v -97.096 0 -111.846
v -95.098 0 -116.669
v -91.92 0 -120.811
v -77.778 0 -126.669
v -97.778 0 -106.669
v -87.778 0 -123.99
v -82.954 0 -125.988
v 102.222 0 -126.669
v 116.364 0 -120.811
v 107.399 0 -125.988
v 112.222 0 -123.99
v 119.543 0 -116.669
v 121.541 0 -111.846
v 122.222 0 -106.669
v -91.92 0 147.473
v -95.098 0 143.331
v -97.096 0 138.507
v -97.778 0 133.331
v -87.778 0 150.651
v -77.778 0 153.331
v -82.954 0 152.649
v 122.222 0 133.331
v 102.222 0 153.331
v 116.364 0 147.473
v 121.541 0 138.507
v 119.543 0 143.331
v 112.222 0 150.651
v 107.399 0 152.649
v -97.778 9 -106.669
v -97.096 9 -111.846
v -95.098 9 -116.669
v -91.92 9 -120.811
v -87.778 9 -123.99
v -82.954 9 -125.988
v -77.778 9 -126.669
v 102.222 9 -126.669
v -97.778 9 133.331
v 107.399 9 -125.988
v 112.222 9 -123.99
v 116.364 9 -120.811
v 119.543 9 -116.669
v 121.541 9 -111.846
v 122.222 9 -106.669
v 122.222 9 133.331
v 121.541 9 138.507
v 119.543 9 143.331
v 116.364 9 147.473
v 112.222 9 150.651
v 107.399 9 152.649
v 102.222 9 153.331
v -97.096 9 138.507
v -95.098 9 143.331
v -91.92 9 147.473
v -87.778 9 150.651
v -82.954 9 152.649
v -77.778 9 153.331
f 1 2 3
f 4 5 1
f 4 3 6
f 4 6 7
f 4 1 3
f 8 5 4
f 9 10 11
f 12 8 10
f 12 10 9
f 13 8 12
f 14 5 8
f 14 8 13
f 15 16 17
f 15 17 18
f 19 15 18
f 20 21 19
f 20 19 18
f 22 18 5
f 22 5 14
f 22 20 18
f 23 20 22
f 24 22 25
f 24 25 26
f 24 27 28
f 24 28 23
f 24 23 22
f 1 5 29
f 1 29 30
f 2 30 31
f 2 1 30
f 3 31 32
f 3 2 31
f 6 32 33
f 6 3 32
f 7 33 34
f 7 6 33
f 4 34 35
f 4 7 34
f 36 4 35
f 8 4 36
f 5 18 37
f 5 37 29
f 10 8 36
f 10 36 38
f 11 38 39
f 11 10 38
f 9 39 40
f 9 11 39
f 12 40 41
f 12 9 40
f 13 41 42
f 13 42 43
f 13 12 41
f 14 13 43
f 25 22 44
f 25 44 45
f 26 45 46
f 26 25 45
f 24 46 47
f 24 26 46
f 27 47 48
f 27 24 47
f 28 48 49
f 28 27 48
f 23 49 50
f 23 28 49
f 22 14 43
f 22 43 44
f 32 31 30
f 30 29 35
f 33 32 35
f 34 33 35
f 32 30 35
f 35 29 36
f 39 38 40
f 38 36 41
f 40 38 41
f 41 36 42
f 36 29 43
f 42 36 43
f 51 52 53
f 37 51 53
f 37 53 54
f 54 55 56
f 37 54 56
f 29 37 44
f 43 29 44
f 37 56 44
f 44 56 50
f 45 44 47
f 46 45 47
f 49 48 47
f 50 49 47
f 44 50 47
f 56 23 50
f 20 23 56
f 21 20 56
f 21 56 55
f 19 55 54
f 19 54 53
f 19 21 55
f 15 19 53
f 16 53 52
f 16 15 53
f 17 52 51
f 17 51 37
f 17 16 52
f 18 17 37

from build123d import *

# Parameters (mm, degrees)
F1_DEPTH = 9


with BuildPart() as f1:
    # F0 (on Front) → F1 (new body)
    with BuildSketch(Plane.XZ):
        with BuildLine():
            ThreePointArc((122.222222, 133.330846), (116.364358, 147.472981), (102.222222, 153.330846))
            Line((102.222222, 153.330846), (-77.777778, 153.330846))
            ThreePointArc((-77.777778, 153.330846), (-91.919913, 147.472981), (-97.777778, 133.330846))
            Line((-97.777778, 133.330846), (-97.777778, -106.646764))
            Line((-97.777778, -106.646764), (-97.777778, -106.669154))
            ThreePointArc((-97.777778, -106.669154), (-91.919913, -120.81129), (-77.777778, -126.669154))
            Line((-77.777778, -126.669154), (102.222222, -126.669154))
            ThreePointArc((102.222222, -126.669154), (116.364358, -120.81129), (122.222222, -106.669154))
            Line((122.222222, -106.669154), (122.222222, 133.330846))
        make_face()
    extrude(amount=-F1_DEPTH)


solid = f1.part
